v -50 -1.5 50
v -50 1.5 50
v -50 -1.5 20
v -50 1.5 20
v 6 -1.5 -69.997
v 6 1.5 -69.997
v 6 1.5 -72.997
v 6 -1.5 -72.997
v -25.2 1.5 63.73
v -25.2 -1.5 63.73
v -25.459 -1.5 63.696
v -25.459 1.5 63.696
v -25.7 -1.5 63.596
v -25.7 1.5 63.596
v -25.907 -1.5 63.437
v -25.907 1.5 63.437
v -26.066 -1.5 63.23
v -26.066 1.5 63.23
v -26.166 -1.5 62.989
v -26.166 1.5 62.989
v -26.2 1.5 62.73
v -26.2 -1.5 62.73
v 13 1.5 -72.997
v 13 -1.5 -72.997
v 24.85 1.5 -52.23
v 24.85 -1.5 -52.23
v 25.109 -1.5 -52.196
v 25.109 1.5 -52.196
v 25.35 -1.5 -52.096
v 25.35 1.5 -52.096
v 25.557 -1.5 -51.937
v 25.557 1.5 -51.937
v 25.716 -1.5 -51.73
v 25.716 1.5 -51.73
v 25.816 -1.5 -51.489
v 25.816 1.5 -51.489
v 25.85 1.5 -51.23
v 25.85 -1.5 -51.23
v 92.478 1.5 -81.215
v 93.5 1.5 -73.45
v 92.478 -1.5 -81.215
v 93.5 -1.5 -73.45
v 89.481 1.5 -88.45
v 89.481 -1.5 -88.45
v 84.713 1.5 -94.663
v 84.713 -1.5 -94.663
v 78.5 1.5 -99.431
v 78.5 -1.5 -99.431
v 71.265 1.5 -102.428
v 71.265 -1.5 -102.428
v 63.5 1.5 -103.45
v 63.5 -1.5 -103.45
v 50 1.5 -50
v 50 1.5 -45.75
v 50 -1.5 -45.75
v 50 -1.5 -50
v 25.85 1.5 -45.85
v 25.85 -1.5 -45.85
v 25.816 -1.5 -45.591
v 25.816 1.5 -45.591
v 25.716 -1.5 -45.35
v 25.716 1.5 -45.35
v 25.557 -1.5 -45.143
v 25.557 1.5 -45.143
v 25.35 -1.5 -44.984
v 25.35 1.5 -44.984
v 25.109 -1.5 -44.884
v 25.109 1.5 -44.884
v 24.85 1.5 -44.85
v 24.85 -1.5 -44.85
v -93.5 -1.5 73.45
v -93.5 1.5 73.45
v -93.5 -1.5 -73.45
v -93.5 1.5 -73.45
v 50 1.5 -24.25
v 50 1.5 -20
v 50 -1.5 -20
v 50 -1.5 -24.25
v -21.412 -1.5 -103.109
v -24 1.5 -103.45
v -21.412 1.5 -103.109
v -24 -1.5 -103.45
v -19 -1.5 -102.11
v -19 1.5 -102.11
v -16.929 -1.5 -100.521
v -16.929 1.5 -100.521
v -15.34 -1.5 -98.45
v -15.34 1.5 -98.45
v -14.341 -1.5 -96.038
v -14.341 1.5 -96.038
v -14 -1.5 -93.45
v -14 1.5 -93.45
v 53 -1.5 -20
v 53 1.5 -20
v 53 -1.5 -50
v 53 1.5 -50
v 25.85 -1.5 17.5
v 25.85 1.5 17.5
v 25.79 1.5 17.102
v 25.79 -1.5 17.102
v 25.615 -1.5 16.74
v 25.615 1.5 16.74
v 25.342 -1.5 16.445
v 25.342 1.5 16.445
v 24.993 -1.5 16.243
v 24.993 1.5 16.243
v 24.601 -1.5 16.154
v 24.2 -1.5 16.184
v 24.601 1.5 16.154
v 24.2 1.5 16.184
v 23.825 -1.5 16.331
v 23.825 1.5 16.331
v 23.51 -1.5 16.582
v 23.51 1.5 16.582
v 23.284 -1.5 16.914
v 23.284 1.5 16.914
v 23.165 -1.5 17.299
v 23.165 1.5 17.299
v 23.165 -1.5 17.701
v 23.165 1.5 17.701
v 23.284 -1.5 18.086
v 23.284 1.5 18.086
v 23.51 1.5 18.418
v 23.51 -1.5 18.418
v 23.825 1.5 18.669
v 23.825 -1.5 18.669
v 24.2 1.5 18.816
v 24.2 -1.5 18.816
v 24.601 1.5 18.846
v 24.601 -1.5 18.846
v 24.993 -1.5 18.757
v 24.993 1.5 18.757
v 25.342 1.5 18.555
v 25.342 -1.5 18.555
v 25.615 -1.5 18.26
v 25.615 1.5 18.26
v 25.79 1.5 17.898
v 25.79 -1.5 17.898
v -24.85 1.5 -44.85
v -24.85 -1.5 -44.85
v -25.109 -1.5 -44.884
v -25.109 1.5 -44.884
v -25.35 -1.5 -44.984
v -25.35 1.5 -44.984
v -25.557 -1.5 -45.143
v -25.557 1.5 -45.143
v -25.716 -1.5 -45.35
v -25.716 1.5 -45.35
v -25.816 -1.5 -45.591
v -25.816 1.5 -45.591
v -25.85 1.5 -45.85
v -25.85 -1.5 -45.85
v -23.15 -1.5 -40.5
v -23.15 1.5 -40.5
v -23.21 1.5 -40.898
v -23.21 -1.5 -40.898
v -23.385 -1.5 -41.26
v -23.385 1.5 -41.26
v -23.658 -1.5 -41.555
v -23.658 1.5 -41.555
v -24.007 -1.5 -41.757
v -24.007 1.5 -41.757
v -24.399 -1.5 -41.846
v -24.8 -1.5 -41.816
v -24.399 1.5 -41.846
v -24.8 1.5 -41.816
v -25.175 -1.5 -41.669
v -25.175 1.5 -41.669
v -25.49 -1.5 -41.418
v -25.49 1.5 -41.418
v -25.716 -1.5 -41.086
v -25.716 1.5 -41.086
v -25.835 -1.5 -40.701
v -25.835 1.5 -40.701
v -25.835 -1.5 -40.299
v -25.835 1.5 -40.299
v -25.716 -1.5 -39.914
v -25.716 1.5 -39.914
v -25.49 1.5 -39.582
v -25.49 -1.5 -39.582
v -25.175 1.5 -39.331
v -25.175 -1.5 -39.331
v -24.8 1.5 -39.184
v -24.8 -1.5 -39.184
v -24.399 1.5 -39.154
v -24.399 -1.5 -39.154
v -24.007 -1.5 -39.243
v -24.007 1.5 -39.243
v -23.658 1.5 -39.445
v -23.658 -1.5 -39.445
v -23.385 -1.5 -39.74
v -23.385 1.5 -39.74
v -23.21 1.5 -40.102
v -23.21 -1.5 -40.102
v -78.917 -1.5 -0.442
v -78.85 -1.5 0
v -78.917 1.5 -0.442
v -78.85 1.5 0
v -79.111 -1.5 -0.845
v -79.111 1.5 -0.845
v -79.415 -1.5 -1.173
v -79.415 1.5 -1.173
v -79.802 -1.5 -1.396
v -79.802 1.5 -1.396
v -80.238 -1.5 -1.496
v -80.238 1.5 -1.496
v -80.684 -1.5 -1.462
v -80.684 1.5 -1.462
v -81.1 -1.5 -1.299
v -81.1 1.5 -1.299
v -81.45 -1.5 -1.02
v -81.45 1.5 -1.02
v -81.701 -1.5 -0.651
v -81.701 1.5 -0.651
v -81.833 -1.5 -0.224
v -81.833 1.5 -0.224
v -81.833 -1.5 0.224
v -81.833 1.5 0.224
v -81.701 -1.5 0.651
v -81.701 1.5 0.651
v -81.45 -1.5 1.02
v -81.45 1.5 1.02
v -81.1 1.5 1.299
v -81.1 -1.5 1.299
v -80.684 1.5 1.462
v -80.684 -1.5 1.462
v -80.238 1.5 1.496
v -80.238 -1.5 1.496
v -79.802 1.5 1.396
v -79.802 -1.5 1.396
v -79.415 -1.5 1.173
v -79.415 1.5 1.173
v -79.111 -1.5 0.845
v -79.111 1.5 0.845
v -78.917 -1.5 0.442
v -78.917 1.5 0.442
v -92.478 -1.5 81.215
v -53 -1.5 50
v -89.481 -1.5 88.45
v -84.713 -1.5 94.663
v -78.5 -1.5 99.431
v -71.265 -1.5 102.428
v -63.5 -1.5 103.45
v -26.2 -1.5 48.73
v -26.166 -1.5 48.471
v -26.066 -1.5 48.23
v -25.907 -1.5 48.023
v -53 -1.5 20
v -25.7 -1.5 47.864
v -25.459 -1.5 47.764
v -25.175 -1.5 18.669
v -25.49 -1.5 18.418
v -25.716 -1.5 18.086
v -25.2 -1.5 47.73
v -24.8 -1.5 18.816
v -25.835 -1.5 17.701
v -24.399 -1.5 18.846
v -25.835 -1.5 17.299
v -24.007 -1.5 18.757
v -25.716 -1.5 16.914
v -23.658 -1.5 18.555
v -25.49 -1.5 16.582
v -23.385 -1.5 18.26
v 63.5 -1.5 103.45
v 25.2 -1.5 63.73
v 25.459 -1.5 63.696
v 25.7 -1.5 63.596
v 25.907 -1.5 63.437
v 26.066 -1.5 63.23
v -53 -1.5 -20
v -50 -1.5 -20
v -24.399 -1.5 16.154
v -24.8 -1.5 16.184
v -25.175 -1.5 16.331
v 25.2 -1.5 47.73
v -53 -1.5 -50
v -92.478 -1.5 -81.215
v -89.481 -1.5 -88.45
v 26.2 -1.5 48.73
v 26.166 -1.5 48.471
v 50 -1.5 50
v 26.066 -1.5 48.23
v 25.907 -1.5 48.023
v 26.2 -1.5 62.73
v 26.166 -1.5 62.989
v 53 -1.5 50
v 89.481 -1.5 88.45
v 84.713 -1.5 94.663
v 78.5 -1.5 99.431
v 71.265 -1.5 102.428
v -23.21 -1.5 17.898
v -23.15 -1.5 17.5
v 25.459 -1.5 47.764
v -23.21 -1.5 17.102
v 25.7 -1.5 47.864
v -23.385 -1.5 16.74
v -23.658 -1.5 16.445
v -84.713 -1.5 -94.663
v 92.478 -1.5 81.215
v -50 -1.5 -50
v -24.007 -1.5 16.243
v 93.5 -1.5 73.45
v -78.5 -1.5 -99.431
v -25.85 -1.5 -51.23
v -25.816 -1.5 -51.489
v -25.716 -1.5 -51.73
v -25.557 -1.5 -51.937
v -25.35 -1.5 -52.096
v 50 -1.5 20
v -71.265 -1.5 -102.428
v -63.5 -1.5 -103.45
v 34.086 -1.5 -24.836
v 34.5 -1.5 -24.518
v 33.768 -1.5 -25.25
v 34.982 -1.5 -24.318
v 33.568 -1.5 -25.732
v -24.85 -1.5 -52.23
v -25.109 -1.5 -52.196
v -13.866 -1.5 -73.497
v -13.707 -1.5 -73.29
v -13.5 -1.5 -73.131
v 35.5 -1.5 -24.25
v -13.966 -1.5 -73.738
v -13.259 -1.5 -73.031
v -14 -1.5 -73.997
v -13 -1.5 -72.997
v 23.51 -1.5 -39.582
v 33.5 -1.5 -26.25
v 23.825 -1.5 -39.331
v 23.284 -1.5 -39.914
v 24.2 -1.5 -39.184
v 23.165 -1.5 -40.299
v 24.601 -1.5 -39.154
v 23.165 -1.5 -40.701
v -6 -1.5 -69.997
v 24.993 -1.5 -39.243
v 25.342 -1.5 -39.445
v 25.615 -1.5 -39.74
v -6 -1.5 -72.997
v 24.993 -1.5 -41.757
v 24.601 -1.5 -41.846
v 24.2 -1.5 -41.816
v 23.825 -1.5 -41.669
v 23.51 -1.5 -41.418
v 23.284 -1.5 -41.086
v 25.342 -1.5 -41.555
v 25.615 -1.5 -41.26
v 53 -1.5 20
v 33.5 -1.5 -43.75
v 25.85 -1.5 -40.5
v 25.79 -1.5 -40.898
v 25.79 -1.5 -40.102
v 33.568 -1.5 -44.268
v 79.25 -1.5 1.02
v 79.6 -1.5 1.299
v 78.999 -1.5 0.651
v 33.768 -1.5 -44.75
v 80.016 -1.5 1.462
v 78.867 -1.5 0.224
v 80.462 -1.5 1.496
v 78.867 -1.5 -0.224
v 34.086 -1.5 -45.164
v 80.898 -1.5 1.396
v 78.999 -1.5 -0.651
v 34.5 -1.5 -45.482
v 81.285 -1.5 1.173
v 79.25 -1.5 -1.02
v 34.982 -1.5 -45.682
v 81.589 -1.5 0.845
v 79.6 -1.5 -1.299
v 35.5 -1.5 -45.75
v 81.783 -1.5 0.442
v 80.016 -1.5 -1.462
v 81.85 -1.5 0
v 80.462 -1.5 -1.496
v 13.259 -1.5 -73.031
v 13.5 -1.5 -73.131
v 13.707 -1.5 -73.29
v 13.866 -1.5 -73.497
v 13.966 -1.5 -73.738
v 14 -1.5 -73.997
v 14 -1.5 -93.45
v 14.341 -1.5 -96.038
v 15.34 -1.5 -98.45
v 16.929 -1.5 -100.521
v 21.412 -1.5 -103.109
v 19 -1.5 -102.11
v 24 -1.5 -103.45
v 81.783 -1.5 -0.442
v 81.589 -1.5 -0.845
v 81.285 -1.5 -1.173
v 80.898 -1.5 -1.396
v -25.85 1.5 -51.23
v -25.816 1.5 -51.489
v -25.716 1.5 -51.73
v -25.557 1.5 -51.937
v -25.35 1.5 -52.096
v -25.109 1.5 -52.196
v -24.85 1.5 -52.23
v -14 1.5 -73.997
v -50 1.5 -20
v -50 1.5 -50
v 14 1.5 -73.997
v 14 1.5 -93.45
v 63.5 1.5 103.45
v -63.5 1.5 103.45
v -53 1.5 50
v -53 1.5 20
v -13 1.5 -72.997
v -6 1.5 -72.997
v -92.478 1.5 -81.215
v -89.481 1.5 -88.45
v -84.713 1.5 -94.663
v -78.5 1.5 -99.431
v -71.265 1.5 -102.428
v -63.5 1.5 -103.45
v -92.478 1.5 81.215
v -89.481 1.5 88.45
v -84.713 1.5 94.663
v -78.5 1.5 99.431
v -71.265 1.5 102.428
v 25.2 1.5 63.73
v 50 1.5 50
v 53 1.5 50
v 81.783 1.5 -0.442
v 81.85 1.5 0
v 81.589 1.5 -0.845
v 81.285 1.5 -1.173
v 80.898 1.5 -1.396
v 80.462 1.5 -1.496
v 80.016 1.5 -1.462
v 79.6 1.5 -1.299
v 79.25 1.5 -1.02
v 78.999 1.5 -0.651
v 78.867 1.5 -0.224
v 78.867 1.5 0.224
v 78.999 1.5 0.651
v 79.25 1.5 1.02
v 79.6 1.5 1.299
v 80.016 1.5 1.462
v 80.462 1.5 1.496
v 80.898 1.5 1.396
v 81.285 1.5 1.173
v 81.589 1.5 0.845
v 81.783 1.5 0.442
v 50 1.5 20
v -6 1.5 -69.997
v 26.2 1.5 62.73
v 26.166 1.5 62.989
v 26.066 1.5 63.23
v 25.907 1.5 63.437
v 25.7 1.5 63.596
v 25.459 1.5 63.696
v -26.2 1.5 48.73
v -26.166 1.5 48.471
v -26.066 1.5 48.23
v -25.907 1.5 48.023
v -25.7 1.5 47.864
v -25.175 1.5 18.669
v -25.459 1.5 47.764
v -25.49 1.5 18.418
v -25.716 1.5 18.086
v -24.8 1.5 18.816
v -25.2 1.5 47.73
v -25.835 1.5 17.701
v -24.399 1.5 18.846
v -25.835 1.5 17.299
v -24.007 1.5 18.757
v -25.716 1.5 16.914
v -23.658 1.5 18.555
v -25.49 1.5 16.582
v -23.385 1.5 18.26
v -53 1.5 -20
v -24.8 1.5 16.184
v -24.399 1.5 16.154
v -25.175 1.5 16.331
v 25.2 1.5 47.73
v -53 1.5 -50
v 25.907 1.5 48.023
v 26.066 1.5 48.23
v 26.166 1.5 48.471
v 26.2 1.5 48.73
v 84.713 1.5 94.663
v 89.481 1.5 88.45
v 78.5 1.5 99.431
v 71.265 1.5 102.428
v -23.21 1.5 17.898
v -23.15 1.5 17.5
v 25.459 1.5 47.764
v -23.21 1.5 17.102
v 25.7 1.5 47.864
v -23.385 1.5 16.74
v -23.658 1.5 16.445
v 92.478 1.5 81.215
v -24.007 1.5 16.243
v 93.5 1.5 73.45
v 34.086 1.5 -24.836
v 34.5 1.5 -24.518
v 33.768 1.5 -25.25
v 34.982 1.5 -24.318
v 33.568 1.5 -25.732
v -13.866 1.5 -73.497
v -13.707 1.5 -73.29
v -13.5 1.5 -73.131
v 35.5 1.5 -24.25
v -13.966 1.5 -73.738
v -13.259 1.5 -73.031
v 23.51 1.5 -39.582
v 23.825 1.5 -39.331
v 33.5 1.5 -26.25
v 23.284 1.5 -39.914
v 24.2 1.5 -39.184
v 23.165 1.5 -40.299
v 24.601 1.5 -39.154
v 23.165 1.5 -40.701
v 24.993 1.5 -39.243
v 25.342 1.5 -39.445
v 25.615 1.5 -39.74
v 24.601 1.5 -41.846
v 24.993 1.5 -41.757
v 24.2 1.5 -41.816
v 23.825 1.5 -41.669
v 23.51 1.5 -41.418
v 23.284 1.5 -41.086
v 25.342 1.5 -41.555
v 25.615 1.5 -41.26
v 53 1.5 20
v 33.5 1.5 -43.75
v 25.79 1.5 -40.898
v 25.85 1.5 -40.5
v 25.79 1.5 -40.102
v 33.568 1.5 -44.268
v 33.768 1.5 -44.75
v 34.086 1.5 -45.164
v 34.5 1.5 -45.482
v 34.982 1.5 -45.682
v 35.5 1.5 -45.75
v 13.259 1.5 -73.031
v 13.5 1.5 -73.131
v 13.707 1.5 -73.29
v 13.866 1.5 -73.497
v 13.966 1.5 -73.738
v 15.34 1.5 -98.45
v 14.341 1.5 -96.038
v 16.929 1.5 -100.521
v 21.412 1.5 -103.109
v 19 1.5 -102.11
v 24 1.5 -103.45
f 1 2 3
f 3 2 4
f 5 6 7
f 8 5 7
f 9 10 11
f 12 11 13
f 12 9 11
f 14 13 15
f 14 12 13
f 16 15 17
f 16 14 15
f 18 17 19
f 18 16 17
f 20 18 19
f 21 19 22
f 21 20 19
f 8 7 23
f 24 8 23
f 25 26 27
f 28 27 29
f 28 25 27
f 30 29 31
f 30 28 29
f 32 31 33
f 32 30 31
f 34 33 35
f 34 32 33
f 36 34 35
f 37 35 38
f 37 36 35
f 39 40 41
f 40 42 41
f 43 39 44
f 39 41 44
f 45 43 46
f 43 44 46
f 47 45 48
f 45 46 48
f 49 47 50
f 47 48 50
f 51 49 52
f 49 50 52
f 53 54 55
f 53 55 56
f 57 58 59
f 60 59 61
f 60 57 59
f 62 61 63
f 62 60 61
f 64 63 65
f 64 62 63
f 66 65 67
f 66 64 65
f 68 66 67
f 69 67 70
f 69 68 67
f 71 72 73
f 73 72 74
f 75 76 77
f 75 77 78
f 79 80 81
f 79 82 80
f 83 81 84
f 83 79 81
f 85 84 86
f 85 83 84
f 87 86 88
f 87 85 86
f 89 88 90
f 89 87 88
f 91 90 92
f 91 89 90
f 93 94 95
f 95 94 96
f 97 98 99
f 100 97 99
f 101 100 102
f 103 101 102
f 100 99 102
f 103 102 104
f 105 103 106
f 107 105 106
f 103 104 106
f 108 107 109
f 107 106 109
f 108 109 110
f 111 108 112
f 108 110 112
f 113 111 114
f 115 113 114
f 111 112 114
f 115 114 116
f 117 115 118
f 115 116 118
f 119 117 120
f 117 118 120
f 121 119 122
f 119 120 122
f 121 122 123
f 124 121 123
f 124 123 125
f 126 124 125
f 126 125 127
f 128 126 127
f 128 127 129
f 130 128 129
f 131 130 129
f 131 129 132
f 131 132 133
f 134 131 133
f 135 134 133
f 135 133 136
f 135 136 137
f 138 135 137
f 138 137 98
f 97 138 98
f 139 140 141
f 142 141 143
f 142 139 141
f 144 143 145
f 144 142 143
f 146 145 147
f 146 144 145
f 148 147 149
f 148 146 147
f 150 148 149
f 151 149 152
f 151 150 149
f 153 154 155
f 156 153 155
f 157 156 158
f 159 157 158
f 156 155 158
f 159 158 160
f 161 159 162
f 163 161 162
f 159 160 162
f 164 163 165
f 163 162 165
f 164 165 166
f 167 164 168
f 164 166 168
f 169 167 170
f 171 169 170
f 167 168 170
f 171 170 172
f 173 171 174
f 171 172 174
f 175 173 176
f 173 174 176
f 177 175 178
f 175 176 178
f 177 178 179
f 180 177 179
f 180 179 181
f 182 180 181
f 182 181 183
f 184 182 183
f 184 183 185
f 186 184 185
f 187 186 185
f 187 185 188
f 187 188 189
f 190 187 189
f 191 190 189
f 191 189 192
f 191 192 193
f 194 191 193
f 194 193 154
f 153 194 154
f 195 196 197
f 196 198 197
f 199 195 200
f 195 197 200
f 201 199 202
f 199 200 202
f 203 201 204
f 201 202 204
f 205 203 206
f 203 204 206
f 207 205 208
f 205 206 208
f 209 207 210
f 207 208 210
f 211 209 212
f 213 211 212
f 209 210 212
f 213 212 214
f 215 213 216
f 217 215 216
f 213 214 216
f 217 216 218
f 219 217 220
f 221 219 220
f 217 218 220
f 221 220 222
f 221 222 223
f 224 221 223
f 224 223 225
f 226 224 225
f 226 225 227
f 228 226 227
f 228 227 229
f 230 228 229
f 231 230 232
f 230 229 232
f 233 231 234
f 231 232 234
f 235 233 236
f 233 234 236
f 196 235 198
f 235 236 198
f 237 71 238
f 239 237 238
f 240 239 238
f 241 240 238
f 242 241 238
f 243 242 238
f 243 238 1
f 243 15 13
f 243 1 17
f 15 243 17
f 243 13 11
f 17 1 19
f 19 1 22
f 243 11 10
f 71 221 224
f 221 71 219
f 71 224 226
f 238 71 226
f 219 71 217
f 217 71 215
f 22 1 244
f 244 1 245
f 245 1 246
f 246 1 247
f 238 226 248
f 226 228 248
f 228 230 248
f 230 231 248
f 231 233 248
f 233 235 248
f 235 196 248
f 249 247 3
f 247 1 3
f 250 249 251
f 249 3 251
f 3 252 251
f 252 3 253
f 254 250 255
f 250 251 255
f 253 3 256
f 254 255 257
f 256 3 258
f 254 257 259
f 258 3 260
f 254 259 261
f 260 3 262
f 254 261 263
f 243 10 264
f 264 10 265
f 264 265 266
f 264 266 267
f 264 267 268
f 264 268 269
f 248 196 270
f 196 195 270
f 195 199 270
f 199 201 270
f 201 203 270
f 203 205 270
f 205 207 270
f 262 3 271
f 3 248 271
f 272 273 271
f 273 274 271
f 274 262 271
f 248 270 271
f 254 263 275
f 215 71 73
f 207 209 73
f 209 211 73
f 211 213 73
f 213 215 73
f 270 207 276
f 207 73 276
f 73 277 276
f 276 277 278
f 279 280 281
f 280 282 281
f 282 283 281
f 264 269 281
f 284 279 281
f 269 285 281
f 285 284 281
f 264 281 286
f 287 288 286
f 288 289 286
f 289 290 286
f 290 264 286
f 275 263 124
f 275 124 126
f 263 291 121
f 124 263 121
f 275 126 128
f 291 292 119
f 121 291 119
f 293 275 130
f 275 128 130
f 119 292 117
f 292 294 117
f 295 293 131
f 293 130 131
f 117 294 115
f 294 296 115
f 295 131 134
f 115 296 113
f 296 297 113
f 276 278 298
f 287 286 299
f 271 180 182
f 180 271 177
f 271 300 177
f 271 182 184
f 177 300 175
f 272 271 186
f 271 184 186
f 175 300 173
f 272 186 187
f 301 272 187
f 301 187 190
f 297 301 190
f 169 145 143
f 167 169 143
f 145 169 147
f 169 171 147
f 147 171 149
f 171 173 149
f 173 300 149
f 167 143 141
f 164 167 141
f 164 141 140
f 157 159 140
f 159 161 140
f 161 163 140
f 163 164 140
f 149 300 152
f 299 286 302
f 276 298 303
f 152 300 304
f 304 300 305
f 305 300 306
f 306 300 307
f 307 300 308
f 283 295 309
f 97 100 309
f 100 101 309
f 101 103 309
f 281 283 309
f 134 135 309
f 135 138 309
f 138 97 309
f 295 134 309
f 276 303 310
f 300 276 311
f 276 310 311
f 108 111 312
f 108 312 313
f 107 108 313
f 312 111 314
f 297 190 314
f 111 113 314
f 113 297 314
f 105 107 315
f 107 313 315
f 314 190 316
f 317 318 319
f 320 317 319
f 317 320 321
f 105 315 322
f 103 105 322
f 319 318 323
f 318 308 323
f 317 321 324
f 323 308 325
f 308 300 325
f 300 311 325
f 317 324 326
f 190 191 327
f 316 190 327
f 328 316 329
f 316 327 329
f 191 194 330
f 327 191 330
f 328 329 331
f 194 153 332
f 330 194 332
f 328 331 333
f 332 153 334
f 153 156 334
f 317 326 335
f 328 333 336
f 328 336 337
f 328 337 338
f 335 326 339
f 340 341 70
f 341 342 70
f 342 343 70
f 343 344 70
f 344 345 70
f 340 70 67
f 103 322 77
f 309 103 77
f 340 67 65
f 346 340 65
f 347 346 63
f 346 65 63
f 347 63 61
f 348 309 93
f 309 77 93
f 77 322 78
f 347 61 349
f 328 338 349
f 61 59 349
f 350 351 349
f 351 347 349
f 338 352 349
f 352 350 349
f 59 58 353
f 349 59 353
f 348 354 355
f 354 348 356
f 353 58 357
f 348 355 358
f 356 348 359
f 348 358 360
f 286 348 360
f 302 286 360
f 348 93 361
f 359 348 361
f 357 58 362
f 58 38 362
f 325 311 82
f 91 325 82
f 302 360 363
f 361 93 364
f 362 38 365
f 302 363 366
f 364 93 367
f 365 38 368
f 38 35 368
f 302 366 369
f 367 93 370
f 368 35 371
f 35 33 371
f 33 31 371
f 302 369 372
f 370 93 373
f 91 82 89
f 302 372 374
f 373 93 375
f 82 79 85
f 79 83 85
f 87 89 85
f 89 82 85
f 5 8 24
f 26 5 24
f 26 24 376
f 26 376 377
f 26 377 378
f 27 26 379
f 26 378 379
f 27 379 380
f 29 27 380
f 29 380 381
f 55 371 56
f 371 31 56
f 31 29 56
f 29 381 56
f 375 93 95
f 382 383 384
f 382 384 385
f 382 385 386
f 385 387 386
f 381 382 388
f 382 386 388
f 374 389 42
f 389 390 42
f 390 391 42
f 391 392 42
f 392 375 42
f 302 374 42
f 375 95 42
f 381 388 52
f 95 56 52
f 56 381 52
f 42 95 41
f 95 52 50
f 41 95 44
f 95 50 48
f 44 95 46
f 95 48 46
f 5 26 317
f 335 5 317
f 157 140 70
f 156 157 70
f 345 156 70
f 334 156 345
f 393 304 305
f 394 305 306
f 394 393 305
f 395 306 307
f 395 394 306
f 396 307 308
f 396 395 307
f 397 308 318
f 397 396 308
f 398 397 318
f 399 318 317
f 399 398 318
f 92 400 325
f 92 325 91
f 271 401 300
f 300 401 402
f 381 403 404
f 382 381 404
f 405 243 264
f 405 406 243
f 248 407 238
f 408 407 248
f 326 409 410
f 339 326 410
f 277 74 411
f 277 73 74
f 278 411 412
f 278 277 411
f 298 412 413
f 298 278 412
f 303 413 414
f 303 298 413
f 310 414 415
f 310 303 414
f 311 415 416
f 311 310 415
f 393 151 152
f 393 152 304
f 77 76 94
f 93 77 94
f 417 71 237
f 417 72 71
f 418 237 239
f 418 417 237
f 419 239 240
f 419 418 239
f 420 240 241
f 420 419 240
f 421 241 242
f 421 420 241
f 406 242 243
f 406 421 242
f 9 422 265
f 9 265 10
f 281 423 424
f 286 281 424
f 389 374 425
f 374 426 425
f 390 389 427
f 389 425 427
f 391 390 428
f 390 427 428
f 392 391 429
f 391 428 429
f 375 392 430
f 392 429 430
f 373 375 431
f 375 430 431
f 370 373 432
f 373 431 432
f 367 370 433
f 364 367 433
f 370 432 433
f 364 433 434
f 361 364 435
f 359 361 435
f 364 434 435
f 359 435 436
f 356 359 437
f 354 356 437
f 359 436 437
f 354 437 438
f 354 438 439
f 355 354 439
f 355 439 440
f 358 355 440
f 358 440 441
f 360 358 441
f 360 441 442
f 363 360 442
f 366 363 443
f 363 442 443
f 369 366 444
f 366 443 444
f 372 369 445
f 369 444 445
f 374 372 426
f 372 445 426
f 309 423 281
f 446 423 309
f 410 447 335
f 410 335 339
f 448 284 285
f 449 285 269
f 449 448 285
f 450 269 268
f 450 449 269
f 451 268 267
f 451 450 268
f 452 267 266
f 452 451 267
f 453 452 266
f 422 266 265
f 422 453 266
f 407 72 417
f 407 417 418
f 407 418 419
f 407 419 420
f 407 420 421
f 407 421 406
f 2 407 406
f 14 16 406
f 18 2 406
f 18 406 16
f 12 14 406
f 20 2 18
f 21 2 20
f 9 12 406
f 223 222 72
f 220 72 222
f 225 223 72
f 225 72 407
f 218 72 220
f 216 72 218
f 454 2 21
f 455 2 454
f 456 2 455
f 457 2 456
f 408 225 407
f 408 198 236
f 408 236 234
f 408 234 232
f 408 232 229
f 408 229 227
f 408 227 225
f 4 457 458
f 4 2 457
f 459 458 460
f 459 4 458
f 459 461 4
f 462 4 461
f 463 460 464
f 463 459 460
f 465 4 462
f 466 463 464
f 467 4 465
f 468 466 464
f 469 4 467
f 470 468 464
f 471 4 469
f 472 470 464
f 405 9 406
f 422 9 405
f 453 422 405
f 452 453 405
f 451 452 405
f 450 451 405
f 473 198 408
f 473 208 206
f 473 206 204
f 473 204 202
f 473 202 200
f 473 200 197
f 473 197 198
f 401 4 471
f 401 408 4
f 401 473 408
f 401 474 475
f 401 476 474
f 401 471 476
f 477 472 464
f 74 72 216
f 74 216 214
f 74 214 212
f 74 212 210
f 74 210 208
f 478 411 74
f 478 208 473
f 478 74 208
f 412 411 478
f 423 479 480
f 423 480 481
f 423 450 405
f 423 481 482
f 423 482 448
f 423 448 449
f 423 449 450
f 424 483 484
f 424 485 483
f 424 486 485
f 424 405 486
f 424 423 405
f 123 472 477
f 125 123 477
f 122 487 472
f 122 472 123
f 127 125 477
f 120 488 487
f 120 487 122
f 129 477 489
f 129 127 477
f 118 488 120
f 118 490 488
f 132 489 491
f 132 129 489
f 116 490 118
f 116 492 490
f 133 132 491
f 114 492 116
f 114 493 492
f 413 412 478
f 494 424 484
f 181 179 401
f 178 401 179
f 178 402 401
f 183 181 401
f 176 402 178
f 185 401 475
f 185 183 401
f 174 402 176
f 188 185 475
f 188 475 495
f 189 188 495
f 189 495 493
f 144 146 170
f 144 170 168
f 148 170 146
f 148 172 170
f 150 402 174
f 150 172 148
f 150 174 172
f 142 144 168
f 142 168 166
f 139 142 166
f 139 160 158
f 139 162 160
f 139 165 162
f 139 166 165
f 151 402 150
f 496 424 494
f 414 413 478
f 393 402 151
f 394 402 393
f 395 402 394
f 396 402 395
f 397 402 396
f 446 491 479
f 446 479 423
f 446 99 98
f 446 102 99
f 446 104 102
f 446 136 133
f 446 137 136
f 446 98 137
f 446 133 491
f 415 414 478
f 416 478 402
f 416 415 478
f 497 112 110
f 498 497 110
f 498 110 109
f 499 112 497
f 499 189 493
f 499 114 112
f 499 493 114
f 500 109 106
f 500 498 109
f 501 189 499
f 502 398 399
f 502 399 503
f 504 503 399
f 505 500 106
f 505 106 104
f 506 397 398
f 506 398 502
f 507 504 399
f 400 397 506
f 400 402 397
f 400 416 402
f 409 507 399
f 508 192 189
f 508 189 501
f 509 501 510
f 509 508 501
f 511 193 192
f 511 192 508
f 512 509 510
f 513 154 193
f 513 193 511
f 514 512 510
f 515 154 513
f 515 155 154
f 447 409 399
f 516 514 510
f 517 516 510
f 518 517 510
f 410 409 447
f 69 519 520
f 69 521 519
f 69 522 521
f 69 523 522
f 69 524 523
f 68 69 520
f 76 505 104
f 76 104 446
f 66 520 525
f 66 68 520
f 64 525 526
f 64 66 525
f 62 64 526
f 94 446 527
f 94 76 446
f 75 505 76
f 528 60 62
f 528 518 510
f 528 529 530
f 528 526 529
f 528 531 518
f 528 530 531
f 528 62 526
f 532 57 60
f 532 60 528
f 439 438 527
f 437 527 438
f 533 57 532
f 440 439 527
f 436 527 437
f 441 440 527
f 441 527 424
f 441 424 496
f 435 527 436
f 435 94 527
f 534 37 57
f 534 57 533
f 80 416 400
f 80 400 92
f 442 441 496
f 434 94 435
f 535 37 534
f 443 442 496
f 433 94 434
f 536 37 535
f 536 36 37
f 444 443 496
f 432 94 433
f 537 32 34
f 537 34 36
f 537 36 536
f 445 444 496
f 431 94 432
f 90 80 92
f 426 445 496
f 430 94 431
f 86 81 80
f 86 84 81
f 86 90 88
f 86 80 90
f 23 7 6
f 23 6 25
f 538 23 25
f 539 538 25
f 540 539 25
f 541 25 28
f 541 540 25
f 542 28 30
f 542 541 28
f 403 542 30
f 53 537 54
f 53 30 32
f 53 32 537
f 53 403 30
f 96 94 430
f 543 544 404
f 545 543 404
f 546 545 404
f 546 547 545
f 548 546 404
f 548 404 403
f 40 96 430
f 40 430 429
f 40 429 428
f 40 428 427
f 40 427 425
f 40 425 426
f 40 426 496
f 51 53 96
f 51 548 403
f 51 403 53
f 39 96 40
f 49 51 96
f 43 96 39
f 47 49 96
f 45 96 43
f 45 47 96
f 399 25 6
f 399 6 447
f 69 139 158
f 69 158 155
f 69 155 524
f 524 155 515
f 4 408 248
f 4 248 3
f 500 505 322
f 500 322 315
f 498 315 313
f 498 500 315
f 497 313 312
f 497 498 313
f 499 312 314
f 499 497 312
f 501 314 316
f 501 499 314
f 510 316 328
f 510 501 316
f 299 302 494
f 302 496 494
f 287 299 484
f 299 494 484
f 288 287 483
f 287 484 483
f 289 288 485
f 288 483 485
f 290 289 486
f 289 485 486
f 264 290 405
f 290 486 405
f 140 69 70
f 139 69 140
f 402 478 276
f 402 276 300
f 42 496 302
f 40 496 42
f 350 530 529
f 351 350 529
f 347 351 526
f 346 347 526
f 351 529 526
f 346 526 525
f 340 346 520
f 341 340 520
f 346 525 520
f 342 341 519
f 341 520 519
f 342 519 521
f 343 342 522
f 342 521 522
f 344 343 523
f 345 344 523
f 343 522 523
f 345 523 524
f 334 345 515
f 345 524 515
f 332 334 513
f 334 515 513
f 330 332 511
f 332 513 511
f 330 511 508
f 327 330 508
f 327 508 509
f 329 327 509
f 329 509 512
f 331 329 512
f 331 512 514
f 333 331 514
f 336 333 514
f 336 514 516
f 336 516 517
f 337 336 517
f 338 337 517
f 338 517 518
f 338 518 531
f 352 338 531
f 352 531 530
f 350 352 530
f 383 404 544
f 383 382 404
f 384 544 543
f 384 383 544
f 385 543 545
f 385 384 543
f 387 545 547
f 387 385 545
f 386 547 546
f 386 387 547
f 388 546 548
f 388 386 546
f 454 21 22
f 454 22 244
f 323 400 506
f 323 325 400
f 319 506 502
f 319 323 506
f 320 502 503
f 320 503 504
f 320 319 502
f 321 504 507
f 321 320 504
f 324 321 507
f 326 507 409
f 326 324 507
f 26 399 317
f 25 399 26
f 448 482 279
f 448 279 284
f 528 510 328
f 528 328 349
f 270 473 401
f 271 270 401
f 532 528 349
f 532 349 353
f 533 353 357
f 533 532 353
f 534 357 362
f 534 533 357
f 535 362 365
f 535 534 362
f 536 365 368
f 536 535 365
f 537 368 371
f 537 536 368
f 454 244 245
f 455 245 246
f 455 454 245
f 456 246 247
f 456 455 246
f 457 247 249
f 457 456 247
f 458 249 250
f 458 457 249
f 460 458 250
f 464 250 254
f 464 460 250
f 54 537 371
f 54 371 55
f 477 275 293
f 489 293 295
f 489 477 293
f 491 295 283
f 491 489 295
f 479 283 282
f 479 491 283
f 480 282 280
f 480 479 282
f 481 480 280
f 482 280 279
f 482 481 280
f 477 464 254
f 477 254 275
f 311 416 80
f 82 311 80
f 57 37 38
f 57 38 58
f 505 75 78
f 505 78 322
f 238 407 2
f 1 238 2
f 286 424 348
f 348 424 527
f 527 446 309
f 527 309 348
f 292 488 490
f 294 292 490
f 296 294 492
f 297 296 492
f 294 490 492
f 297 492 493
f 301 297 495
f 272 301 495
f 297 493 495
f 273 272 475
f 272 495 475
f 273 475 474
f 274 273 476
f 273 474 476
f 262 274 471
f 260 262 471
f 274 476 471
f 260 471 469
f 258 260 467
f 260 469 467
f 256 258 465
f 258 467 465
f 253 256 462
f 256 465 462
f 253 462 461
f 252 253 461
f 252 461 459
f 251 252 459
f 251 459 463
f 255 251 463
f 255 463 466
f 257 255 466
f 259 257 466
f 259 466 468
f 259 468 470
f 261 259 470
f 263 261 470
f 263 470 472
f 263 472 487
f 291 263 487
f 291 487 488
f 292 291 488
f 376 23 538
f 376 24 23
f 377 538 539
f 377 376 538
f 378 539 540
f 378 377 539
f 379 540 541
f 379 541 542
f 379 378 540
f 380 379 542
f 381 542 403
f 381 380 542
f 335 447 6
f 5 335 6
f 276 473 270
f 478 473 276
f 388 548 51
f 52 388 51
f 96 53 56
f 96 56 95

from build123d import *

# Parameters (mm, degrees)
SKETCH1_W                = 187
SKETCH1_H                = 206.9
BOSS_EXTRUDE1_DEPTH      = 1.5
FILLET1_R                = 30
SKETCH2_W                = 3
SKETCH2_H                = 30
CUT_EXTRUDE1_DEPTH       = 2.5
CUT_EXTRUDE1_DEPTH_BACK  = 2.5
SKETCH4_R                = 1.35
CUT_EXTRUDE3_DEPTH       = 1
CUT_EXTRUDE3_DEPTH_BACK  = 4
CUT_EXTRUDE2_DEPTH       = 4
CUT_EXTRUDE5_DEPTH       = 1
CUT_EXTRUDE5_DEPTH_BACK  = 4
CUT_EXTRUDE6_DEPTH       = 2.5
CUT_EXTRUDE6_DEPTH_BACK  = 2.5
SKETCH10_R               = 1.5
CUT_EXTRUDE9_DEPTH       = 2.5
CUT_EXTRUDE9_DEPTH_BACK  = 2.5
SKETCH11_W               = 28
SKETCH11_H               = 30.45294386
CUT_EXTRUDE10_DEPTH      = 1
CUT_EXTRUDE10_DEPTH_BACK = 4
FILLET2_R                = 10
FILLET2_2_R              = 1
SKETCH12_W               = 12
SKETCH12_H               = 3
CUT_EXTRUDE11_DEPTH      = 2.5
CUT_EXTRUDE11_DEPTH_BACK = 2.5


with BuildPart() as part:
    # Sketch1 → Boss-Extrude1 (new body, symmetric)
    with BuildSketch(Plane(origin=(0, 0, 0), x_dir=(1, 0, 0), z_dir=(0, 1, 0))):
        Rectangle(SKETCH1_W, SKETCH1_H)
    extrude(amount=BOSS_EXTRUDE1_DEPTH, both=True)

    # Fillet1
    fillet1_edges = [part.edges().sort_by_distance(p)[0] for p in [
        (-93.5, 0, -103.45),
        (93.5, 0, -103.45),
        (93.5, 0, 103.45),
        (-93.5, 0, 103.45),
    ]]
    fillet(fillet1_edges, radius=FILLET1_R)

    # Sketch2 → Cut-Extrude1 (cut, two sides)
    with BuildSketch(Plane(origin=(0, 0, 0), x_dir=(1, 0, 0), z_dir=(0, 1, 0))) as cut_extrude1_sk:
        with Locations((-51.5, 35)):
            Rectangle(SKETCH2_W, SKETCH2_H)
        with Locations((-51.5, -35)):
            Rectangle(SKETCH2_W, SKETCH2_H)
        with Locations((51.5, -35)):
            Rectangle(SKETCH2_W, SKETCH2_H)
        with Locations((51.5, 35)):
            Rectangle(SKETCH2_W, SKETCH2_H)
    extrude(amount=CUT_EXTRUDE1_DEPTH, mode=Mode.SUBTRACT)
    extrude(cut_extrude1_sk.sketch, amount=-CUT_EXTRUDE1_DEPTH_BACK, mode=Mode.SUBTRACT)

    # Sketch4 → Cut-Extrude3 (cut, two sides)
    with BuildSketch(Plane(origin=(0, 1.5, 0), x_dir=(1, 0, 0), z_dir=(0, 1, 0))) as cut_extrude3_sk:
        with Locations((24.5, -17.5)):
            Circle(SKETCH4_R)
        with Locations((-24.5, -17.5)):
            Circle(SKETCH4_R)
        with Locations((24.5, 40.5)):
            Circle(SKETCH4_R)
        with Locations((-24.5, 40.5)):
            Circle(SKETCH4_R)
    extrude(amount=CUT_EXTRUDE3_DEPTH, mode=Mode.SUBTRACT)
    extrude(cut_extrude3_sk.sketch, amount=-CUT_EXTRUDE3_DEPTH_BACK, mode=Mode.SUBTRACT)

    # Sketch3 → Cut-Extrude2 (cut, through all)
    with BuildSketch(Plane(origin=(0, 1.5, 0), x_dir=(1, 0, 0), z_dir=(0, 1, 0))):
        with BuildLine():
            Line((50, 45.75), (50, 24.25))
            Line((50, 24.25), (35.5, 24.25))
            ThreePointArc((35.5, 24.25), (34.085786438, 24.835786438), (33.5, 26.25))
            Line((33.5, 26.25), (33.5, 43.75))
            ThreePointArc((33.5, 43.75), (34.085786438, 45.164213562), (35.5, 45.75))
            Line((35.5, 45.75), (50, 45.75))
        make_face()
    extrude(amount=-CUT_EXTRUDE2_DEPTH, mode=Mode.SUBTRACT)

    # Sketch6 → Cut-Extrude5 (cut, two sides)
    with BuildSketch(Plane(origin=(0, 1.5, 0), x_dir=(1, 0, 0), z_dir=(0, 1, 0))) as cut_extrude5_sk:
        with BuildLine():
            Line((-25.2, -47.73), (25.2, -47.73))
            ThreePointArc((25.2, -47.73), (25.907106781, -48.022893219), (26.2, -48.73))
            Line((26.2, -48.73), (26.2, -62.73))
            ThreePointArc((26.2, -62.73), (25.907106781, -63.437106781), (25.2, -63.73))
            Line((25.2, -63.73), (-25.2, -63.73))
            ThreePointArc((-25.2, -63.73), (-25.907106781, -63.437106781), (-26.2, -62.73))
            Line((-26.2, -62.73), (-26.2, -48.73))
            ThreePointArc((-26.2, -48.73), (-25.907106781, -48.022893219), (-25.2, -47.73))
        make_face()
    extrude(amount=CUT_EXTRUDE5_DEPTH, mode=Mode.SUBTRACT)
    extrude(cut_extrude5_sk.sketch, amount=-CUT_EXTRUDE5_DEPTH_BACK, mode=Mode.SUBTRACT)

    # Sketch7 → Cut-Extrude6 (cut, two sides)
    with BuildSketch(Plane(origin=(0, 0, 0), x_dir=(1, 0, 0), z_dir=(0, 1, 0))) as cut_extrude6_sk:
        with BuildLine():
            Line((-24.85, 52.23), (24.85, 52.23))
            ThreePointArc((24.85, 52.23), (25.557106781, 51.937106781), (25.85, 51.23))
            Line((25.85, 51.23), (25.85, 45.85))
            ThreePointArc((25.85, 45.85), (25.557106781, 45.142893219), (24.85, 44.85))
            Line((24.85, 44.85), (-24.85, 44.85))
            ThreePointArc((-24.85, 44.85), (-25.557106781, 45.142893219), (-25.85, 45.85))
            Line((-25.85, 45.85), (-25.85, 51.23))
            ThreePointArc((-25.85, 51.23), (-25.557106781, 51.937106781), (-24.85, 52.23))
        make_face()
    extrude(amount=CUT_EXTRUDE6_DEPTH, mode=Mode.SUBTRACT)
    extrude(cut_extrude6_sk.sketch, amount=-CUT_EXTRUDE6_DEPTH_BACK, mode=Mode.SUBTRACT)

    # Sketch10 → Cut-Extrude9 (cut, two sides)
    with BuildSketch(Plane(origin=(0, 0, 0), x_dir=(1, 0, 0), z_dir=(0, 1, 0))) as cut_extrude9_sk:
        with Locations((-80.35, 0)):
            Circle(SKETCH10_R)
        with Locations((80.35, 0)):
            Circle(SKETCH10_R)
    extrude(amount=CUT_EXTRUDE9_DEPTH, mode=Mode.SUBTRACT)
    extrude(cut_extrude9_sk.sketch, amount=-CUT_EXTRUDE9_DEPTH_BACK, mode=Mode.SUBTRACT)

    # Sketch11 → Cut-Extrude10 (cut, two sides)
    with BuildSketch(Plane(origin=(0, 1.5, 0), x_dir=(1, 0, 0), z_dir=(0, 1, 0))) as cut_extrude10_sk:
        with Locations((0, 88.22352807)):
            Rectangle(SKETCH11_W, SKETCH11_H)
    extrude(amount=CUT_EXTRUDE10_DEPTH, mode=Mode.SUBTRACT)
    extrude(cut_extrude10_sk.sketch, amount=-CUT_EXTRUDE10_DEPTH_BACK, mode=Mode.SUBTRACT)

    # Fillet2
    fillet2_edges = [part.edges().sort_by_distance(p)[0] for p in [
        (-14, 0, -103.45),
        (14, 0, -103.45),
    ]]
    fillet(fillet2_edges, radius=FILLET2_R)

    # Fillet2 2
    fillet2_2_edges = [part.edges().sort_by_distance(p)[0] for p in [
        (-14, 0, -72.99705614),
        (14, 0, -72.99705614),
    ]]
    fillet(fillet2_2_edges, radius=FILLET2_2_R)

    # Sketch12 → Cut-Extrude11 (cut, two sides)
    with BuildSketch(Plane(origin=(0, 0, 0), x_dir=(1, 0, 0), z_dir=(0, 1, 0))) as cut_extrude11_sk:
        with Locations((0, 71.49705614)):
            Rectangle(SKETCH12_W, SKETCH12_H)
    extrude(amount=CUT_EXTRUDE11_DEPTH, mode=Mode.SUBTRACT)
    extrude(cut_extrude11_sk.sketch, amount=-CUT_EXTRUDE11_DEPTH_BACK, mode=Mode.SUBTRACT)


solid = part.part
